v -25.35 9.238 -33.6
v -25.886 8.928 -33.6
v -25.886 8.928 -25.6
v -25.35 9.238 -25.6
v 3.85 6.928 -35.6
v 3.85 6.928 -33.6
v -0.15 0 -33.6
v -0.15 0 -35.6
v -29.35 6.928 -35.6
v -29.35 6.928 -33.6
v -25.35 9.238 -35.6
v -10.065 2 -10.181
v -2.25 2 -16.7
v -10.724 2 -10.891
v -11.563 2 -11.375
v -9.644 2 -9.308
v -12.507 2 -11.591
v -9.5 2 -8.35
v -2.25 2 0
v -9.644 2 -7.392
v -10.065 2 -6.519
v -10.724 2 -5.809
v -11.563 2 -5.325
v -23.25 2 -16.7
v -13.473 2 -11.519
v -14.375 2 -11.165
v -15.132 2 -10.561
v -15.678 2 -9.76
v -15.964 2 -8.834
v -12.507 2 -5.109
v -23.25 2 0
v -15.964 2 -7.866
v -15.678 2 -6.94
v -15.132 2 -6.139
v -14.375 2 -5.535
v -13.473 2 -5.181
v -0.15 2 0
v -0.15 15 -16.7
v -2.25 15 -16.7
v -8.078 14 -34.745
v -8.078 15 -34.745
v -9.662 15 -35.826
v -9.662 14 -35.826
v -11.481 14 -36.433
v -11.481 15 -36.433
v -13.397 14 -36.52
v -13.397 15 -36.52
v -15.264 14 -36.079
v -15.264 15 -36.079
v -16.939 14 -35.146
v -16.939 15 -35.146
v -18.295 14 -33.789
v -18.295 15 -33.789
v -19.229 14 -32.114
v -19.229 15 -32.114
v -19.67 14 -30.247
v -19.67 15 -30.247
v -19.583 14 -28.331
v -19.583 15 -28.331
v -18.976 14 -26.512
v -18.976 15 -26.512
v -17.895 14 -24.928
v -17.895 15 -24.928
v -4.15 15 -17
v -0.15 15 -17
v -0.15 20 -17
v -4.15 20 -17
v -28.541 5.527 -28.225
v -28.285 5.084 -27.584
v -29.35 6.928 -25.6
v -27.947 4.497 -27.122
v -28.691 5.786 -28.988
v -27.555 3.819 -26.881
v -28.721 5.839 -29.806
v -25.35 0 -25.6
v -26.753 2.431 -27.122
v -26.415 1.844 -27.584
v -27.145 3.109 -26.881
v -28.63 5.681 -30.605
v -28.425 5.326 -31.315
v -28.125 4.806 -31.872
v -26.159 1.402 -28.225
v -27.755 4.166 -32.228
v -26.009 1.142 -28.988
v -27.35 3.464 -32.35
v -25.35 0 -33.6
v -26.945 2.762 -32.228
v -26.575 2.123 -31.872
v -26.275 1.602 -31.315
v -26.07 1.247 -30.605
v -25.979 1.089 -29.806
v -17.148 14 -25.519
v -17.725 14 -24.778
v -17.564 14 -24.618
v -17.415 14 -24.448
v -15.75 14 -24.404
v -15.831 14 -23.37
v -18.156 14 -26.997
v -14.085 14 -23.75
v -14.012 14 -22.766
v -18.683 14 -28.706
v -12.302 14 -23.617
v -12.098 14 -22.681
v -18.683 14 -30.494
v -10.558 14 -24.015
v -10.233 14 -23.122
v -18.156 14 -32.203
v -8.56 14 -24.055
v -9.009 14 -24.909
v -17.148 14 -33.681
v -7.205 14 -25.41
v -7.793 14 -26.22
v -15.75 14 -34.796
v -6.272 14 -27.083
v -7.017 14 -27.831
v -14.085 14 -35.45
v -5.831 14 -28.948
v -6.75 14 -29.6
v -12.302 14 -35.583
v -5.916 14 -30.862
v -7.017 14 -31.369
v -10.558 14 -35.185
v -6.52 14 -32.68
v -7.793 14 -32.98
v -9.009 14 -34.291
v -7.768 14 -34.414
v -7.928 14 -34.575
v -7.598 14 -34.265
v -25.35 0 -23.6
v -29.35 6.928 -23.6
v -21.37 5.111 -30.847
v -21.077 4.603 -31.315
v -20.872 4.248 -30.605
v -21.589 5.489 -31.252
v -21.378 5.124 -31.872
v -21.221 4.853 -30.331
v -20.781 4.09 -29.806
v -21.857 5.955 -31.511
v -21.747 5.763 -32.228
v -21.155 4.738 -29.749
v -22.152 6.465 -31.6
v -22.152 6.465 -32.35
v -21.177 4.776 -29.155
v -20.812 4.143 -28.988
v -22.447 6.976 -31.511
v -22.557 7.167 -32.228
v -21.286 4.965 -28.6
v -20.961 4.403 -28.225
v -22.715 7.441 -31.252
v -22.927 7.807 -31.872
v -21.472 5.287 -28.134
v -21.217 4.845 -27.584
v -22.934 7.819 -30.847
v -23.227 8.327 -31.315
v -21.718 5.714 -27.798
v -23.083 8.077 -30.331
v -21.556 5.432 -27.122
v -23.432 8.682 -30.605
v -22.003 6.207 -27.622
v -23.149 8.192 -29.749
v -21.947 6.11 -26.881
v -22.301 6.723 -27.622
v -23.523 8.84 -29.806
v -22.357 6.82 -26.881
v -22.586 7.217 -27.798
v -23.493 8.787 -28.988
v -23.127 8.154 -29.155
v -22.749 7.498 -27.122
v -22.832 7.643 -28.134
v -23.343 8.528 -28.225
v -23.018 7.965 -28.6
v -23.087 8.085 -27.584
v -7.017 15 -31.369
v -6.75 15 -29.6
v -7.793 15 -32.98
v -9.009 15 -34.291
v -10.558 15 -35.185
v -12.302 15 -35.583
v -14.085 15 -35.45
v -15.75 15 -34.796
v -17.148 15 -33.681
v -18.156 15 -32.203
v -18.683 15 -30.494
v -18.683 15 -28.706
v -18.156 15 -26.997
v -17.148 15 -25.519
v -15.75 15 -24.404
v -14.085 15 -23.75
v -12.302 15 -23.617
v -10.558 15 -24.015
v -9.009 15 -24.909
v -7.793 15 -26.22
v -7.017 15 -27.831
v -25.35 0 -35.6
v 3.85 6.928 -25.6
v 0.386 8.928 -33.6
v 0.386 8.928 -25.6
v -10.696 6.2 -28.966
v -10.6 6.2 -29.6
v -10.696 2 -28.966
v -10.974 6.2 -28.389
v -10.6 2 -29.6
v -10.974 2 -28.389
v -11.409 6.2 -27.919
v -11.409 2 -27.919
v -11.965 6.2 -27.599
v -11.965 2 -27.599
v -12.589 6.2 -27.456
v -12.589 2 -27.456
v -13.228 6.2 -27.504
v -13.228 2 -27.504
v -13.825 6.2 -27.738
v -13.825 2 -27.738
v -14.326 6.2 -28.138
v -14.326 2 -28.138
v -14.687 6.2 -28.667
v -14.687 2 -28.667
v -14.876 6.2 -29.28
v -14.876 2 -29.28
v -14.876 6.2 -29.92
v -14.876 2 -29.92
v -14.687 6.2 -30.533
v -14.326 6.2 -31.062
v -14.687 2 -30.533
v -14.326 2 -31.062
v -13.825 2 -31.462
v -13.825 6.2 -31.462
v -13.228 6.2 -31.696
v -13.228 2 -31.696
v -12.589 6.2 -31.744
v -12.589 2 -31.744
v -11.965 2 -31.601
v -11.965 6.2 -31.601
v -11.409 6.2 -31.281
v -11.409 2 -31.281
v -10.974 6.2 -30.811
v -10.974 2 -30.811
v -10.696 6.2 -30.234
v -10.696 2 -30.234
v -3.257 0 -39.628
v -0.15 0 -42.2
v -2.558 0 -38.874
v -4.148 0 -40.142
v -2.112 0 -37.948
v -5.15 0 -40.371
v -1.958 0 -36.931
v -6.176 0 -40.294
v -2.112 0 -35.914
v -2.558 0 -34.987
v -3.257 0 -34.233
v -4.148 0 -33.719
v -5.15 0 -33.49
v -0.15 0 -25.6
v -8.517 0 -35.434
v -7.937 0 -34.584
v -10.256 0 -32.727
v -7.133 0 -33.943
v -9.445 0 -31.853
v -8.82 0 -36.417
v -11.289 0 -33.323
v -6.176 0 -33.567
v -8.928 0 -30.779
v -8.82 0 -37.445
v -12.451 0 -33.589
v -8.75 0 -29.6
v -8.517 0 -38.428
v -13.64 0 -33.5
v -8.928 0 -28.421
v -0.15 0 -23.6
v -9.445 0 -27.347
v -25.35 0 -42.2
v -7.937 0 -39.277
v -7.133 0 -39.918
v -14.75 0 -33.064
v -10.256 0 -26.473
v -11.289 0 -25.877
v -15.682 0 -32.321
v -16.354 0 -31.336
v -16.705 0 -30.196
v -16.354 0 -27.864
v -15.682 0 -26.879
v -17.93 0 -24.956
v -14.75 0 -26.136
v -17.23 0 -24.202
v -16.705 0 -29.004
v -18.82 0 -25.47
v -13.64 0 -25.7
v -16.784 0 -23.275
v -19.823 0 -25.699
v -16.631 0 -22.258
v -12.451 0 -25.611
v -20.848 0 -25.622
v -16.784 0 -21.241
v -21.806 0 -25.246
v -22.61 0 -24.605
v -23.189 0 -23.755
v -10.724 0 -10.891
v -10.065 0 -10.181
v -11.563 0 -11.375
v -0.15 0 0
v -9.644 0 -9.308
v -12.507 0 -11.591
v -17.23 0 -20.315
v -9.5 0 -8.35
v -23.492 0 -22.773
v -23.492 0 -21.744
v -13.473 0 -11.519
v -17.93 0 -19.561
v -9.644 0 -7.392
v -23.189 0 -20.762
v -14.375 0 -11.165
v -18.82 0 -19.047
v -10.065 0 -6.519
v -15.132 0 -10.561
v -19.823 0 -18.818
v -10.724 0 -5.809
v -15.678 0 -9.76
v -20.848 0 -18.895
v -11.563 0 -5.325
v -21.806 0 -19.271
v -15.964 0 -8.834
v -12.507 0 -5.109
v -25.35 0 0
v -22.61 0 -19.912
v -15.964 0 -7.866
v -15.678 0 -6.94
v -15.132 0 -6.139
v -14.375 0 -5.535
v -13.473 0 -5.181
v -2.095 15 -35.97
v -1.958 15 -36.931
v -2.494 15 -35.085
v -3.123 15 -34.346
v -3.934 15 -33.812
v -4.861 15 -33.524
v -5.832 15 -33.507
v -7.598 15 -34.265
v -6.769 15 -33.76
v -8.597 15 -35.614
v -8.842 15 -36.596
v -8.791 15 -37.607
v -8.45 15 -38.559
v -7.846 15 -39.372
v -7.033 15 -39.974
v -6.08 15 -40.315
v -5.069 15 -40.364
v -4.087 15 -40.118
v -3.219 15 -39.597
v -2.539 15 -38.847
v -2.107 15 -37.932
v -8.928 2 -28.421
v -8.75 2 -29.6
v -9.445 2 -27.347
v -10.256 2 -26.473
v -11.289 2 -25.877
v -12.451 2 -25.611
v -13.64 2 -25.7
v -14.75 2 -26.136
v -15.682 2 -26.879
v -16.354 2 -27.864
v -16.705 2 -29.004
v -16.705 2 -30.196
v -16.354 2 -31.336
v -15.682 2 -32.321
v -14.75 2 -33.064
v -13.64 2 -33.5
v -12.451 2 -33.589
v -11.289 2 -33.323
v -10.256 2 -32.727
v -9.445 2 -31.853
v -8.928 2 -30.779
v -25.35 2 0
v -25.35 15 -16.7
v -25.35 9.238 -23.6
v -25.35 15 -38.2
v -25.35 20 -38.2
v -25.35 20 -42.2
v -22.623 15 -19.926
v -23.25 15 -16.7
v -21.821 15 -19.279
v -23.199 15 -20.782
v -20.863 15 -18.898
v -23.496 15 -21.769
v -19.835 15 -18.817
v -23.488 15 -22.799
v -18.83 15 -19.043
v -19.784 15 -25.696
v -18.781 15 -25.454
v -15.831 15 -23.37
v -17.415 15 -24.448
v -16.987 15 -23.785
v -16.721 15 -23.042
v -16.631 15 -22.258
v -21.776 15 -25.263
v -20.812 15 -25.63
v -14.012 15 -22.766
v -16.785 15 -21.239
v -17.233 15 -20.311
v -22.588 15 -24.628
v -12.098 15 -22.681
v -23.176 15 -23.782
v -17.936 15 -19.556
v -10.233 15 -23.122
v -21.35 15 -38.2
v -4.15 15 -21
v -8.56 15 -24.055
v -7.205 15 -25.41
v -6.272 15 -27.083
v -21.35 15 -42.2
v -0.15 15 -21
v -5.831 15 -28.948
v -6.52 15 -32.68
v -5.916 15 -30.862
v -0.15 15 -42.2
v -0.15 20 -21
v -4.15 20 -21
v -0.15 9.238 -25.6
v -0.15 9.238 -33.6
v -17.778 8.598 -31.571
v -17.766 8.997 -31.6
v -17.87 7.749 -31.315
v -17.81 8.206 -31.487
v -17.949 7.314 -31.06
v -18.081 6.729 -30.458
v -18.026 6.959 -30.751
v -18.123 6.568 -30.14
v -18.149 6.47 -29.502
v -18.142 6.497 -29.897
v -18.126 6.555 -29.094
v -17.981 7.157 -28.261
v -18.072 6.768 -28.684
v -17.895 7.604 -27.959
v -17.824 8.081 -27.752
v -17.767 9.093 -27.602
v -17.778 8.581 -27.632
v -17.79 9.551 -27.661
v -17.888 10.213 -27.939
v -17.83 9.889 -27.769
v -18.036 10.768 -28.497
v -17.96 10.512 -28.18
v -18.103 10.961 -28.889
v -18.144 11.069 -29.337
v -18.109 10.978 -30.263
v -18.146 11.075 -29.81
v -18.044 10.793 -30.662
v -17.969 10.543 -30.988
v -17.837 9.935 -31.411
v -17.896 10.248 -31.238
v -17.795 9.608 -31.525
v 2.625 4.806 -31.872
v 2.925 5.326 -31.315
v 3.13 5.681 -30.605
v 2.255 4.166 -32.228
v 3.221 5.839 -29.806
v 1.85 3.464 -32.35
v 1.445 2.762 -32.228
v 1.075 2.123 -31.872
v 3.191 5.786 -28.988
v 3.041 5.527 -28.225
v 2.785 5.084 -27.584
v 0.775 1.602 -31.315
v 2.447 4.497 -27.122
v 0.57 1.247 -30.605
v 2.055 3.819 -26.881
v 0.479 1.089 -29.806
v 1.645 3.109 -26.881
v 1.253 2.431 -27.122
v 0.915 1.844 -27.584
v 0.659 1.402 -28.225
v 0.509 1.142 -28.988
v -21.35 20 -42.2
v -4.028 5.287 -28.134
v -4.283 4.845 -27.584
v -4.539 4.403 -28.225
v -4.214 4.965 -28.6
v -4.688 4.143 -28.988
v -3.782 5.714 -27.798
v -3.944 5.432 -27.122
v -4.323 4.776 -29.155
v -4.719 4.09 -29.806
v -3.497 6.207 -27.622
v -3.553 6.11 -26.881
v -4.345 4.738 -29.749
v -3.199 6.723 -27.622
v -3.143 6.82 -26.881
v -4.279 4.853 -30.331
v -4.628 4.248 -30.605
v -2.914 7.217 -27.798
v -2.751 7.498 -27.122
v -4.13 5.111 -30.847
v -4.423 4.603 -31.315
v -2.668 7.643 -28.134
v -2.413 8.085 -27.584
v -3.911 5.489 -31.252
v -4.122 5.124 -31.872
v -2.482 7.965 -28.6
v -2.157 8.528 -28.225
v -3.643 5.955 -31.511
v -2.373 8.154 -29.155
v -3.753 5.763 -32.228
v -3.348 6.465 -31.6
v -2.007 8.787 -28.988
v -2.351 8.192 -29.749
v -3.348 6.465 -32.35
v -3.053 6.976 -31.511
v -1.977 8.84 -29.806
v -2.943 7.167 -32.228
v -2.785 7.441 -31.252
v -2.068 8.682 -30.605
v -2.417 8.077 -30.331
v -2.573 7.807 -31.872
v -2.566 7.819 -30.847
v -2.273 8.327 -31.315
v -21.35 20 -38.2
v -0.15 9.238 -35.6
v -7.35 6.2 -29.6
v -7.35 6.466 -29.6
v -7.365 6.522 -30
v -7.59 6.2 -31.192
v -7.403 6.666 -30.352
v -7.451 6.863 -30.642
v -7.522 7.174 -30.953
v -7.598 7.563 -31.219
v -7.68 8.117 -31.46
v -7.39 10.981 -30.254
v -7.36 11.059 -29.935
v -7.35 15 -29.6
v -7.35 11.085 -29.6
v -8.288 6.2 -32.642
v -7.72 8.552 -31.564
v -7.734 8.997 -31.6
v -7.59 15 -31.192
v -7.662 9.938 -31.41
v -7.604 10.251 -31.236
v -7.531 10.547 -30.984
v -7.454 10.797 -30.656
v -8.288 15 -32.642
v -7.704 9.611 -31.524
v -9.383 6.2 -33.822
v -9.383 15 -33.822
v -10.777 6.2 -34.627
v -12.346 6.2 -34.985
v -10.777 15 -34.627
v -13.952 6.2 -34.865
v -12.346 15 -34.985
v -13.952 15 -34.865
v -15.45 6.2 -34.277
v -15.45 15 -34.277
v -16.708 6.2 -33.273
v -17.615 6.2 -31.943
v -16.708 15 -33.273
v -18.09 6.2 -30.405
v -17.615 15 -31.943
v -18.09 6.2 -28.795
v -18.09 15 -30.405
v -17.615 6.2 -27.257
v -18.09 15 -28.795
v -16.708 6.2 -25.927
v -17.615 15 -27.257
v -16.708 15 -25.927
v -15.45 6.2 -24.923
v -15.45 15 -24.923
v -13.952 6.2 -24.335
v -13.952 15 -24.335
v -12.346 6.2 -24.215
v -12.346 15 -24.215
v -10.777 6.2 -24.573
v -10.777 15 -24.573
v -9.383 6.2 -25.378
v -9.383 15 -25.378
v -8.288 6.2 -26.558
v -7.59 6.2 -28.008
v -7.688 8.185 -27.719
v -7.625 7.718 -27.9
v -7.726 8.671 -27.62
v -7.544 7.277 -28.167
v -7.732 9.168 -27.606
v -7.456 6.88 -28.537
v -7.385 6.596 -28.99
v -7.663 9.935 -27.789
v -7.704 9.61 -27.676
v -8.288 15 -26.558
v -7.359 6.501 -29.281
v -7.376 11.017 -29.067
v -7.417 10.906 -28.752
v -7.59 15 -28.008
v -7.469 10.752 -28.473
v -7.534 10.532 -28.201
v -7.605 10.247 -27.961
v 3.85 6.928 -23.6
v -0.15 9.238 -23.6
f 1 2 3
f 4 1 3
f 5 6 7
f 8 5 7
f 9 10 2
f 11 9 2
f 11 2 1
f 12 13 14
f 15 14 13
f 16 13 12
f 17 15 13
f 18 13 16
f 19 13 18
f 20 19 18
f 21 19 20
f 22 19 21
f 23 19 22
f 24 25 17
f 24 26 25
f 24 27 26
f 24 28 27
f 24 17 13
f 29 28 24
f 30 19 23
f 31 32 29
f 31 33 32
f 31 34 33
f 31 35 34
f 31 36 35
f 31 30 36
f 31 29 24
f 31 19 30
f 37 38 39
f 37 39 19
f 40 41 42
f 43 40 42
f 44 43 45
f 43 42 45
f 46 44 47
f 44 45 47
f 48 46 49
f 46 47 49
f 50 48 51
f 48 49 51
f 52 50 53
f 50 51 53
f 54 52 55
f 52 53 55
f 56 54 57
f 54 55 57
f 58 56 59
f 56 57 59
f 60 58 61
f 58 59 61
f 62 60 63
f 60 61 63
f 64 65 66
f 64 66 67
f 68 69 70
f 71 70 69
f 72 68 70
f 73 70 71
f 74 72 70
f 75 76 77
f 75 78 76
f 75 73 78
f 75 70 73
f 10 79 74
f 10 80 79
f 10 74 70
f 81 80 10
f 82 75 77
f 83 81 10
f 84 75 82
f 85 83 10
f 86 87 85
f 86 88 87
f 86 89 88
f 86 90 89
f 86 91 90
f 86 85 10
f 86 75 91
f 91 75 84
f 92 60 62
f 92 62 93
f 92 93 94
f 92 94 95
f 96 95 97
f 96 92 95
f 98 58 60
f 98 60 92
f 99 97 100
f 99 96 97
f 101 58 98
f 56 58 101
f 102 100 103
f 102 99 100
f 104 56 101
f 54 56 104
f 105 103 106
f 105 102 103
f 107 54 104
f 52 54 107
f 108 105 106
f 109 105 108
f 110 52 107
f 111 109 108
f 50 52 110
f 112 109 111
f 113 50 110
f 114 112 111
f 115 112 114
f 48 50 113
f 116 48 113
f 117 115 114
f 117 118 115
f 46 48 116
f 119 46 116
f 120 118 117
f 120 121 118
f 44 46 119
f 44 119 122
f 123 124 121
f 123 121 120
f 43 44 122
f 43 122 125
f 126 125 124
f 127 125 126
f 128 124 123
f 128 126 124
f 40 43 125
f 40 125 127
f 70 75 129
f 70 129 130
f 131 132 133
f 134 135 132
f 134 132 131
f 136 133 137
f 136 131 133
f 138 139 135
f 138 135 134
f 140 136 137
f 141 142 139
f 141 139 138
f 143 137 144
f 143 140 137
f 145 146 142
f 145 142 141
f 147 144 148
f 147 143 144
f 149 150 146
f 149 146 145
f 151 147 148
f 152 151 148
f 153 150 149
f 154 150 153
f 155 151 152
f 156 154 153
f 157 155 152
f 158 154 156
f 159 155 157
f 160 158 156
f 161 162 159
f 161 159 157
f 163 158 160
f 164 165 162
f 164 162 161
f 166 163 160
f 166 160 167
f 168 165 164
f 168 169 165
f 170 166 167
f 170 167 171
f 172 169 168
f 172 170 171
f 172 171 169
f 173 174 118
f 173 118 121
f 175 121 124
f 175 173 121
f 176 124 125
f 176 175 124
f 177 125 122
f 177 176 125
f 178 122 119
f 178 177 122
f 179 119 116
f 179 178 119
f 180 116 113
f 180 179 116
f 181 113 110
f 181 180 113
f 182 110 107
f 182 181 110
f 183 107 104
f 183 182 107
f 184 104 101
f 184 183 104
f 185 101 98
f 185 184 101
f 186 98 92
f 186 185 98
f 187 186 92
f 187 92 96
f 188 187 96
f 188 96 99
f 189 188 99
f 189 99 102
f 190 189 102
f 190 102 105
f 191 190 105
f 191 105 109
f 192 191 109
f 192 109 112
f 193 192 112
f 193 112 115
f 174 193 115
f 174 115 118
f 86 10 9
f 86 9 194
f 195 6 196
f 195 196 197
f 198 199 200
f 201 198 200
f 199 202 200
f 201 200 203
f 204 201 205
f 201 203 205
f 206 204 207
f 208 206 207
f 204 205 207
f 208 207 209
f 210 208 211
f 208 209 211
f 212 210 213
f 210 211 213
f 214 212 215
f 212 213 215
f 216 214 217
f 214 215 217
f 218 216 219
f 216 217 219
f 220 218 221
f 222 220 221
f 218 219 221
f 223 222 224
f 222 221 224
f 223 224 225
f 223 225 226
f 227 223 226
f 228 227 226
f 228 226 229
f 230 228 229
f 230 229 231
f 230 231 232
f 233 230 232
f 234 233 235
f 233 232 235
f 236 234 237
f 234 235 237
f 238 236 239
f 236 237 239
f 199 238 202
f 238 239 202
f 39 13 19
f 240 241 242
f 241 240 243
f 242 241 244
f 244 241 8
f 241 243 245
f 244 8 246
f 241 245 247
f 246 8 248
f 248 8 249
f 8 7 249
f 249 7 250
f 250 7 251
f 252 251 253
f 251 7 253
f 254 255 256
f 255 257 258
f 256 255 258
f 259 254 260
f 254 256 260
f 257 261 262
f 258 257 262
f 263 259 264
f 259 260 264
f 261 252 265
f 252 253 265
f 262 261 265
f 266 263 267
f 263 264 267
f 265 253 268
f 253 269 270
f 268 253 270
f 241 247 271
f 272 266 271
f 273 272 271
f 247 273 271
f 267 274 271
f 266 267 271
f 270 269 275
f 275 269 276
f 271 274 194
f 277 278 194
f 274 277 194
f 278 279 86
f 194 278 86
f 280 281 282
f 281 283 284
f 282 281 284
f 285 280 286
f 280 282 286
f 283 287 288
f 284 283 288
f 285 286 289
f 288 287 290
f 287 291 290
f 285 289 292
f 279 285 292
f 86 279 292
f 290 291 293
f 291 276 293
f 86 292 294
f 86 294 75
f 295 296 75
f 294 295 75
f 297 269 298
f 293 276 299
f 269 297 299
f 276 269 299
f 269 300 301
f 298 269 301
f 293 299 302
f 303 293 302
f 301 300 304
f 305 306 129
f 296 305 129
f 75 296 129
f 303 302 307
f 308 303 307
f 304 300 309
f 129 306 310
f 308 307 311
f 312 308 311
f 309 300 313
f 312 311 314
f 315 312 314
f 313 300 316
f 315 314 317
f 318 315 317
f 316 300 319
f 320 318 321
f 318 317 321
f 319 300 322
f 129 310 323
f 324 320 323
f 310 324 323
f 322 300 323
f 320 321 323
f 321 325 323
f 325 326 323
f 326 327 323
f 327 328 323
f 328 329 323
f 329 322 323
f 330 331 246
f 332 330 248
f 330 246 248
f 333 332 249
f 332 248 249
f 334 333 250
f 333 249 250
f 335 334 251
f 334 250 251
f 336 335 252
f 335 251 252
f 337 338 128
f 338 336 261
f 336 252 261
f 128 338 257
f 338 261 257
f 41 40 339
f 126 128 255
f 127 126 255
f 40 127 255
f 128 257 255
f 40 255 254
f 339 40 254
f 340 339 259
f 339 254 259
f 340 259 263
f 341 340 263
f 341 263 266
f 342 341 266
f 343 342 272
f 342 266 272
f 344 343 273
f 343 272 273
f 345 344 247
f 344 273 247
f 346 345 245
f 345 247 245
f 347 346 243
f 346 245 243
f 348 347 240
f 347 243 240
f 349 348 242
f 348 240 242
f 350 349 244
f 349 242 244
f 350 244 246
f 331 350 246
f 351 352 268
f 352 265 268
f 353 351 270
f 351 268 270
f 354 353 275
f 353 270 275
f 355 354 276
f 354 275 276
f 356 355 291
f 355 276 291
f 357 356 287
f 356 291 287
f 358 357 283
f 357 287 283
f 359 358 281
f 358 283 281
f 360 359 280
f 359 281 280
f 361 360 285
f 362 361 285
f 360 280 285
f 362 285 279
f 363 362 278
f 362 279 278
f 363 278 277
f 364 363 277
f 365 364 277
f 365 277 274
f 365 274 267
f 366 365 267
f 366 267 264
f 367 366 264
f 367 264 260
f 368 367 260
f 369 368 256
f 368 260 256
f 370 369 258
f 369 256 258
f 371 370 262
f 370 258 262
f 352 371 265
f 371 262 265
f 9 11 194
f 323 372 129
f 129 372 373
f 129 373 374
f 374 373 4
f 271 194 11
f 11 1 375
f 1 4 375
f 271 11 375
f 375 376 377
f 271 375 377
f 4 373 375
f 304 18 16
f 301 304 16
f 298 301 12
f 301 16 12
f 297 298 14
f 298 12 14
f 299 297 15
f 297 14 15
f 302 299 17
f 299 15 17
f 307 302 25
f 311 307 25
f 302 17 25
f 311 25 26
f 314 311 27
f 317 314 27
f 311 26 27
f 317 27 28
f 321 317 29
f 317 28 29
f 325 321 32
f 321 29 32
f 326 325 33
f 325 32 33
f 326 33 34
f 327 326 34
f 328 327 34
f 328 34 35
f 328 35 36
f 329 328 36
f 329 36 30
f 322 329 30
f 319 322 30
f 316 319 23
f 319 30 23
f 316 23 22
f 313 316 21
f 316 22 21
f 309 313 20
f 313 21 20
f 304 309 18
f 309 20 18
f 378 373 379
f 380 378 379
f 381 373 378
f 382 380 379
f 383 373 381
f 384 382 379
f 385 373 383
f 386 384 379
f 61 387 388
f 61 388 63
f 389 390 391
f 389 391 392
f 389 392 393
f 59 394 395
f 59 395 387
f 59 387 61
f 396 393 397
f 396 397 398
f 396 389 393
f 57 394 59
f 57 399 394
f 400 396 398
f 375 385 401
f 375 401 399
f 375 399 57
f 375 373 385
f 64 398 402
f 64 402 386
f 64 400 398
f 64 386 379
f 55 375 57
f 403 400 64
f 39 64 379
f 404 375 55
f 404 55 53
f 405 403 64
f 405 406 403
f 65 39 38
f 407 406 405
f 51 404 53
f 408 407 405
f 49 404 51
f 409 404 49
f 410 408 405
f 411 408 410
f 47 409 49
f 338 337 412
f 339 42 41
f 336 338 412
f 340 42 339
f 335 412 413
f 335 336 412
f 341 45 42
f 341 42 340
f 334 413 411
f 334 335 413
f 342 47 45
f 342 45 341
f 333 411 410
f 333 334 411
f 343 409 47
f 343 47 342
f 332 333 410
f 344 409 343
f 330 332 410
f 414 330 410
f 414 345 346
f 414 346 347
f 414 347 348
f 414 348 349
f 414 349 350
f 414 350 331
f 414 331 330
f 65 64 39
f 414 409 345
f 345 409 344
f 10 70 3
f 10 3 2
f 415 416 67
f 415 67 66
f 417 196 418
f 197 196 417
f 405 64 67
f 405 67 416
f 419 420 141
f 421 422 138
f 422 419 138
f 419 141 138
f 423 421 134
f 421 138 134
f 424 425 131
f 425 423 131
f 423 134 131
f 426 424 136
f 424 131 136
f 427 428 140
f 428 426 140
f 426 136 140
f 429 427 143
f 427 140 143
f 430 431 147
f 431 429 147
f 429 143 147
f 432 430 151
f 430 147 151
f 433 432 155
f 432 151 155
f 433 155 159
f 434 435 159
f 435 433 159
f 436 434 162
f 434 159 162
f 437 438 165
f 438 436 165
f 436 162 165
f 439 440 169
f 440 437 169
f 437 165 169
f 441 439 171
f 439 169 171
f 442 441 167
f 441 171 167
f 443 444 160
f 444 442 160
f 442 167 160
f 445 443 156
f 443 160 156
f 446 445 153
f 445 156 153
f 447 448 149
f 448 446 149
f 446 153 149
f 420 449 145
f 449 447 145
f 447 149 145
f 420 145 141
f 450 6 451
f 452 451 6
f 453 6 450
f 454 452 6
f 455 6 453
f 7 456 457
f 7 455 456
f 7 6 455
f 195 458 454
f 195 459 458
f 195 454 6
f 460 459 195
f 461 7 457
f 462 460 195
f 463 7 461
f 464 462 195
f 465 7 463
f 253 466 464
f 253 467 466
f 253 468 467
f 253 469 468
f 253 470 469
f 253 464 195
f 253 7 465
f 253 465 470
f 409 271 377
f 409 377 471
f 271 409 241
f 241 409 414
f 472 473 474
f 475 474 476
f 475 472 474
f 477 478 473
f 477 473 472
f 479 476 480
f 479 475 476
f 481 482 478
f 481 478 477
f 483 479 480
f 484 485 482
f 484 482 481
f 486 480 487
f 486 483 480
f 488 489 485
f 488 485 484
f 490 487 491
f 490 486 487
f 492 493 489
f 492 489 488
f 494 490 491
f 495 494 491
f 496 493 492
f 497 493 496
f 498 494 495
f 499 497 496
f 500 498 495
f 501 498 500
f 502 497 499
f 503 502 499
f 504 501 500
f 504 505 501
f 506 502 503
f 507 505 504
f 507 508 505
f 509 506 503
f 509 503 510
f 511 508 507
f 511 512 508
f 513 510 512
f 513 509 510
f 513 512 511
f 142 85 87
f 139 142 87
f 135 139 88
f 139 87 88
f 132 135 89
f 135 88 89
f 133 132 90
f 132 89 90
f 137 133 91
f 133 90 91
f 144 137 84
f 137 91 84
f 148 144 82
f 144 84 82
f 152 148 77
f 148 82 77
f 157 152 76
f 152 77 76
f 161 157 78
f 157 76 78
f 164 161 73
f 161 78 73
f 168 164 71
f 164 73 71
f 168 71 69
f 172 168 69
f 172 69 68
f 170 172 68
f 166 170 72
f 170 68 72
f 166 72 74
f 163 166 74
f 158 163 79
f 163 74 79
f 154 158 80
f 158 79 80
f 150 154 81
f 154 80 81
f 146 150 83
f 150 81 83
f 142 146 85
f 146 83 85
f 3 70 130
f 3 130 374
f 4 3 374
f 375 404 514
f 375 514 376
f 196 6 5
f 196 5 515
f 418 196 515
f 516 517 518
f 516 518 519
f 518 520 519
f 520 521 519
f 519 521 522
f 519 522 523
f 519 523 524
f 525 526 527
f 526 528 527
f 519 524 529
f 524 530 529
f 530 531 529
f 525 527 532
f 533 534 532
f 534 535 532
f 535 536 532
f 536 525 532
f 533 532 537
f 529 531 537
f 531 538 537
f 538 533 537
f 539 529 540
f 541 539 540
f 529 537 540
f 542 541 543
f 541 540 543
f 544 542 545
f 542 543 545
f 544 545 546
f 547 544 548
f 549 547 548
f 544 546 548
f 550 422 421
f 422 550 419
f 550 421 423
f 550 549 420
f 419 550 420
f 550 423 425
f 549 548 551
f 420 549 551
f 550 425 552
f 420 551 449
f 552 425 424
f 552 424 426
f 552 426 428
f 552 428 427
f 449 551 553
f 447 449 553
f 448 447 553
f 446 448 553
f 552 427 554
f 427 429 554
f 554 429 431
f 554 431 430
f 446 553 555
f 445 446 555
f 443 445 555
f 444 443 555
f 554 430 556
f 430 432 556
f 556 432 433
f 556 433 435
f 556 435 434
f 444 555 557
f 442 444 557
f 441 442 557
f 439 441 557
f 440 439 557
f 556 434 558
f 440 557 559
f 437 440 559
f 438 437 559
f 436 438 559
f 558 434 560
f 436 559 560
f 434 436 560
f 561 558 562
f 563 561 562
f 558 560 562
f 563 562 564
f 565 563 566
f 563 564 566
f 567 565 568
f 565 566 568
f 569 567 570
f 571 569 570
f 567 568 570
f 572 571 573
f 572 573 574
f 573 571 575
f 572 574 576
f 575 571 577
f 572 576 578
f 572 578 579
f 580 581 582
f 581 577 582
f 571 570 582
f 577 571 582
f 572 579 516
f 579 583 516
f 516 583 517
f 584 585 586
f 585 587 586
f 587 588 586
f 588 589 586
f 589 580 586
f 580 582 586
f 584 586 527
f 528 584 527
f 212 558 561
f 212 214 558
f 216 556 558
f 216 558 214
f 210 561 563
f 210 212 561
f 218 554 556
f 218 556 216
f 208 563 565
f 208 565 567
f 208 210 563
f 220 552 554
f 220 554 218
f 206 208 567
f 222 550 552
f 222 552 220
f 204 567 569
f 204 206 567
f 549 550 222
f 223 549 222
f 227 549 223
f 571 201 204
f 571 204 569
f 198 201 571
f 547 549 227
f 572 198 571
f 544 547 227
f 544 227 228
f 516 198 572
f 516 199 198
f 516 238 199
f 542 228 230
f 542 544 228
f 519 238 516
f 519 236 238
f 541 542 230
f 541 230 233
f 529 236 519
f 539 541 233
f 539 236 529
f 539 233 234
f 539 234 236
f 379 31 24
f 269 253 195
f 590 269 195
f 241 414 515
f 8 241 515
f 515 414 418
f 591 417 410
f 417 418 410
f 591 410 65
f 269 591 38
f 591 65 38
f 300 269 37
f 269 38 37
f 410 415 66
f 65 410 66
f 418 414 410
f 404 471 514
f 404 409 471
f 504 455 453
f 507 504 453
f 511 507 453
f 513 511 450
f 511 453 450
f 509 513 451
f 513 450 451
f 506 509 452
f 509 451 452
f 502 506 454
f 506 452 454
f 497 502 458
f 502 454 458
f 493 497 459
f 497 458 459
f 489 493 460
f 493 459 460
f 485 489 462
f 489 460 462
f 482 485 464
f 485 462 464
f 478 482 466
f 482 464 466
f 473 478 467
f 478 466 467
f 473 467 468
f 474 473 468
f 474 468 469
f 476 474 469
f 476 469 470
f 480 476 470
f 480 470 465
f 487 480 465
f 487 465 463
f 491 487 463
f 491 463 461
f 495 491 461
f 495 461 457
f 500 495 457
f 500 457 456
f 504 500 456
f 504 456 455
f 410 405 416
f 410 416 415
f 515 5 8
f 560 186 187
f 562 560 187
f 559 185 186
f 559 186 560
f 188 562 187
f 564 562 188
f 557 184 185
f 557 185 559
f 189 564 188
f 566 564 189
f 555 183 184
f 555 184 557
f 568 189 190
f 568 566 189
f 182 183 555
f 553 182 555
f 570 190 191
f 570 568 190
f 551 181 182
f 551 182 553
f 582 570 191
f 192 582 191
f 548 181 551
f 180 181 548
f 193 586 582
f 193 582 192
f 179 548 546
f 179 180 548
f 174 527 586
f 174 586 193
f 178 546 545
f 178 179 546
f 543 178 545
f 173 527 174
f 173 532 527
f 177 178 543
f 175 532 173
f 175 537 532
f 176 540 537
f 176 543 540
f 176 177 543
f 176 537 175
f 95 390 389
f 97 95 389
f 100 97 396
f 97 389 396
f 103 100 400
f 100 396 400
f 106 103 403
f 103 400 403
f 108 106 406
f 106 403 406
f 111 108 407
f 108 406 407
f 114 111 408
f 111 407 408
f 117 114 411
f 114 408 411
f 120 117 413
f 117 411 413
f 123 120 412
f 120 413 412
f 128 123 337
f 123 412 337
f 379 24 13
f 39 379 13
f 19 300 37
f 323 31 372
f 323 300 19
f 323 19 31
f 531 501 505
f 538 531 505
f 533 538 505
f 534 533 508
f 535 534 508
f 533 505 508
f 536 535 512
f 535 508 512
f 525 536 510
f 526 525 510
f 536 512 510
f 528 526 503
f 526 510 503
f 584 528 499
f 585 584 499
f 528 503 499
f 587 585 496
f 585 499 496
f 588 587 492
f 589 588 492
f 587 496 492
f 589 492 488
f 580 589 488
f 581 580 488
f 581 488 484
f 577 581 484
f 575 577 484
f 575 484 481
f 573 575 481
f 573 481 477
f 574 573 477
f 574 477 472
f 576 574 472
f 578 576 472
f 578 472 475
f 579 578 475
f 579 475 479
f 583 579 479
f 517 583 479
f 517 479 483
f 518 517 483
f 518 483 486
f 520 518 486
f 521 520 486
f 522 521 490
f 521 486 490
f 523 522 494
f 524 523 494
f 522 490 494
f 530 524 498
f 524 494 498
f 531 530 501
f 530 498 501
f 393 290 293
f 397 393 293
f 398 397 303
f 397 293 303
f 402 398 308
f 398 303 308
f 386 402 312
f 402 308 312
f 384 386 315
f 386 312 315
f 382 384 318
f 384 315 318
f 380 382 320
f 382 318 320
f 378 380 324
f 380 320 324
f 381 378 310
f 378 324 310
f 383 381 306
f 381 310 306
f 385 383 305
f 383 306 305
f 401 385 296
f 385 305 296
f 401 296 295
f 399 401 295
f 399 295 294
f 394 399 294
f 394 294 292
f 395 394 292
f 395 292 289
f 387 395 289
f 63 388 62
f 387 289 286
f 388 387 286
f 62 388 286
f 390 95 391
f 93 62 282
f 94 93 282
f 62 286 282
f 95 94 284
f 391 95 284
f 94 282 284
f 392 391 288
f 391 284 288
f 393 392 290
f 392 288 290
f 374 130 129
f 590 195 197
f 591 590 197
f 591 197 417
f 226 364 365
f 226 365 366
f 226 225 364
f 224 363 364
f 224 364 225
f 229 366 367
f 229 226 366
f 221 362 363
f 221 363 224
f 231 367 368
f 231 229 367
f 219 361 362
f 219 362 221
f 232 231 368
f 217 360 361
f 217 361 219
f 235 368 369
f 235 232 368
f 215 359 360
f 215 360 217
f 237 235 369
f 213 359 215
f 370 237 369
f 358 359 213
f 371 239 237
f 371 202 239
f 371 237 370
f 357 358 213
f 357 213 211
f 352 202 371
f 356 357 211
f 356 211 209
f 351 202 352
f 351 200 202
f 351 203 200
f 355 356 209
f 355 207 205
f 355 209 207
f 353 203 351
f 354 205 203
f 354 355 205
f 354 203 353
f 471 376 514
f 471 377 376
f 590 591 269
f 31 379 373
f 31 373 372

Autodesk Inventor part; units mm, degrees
ref_plane "YZ Plane" through (0, 0, 0) normal (1, 0, 0) x (0, 1, 0)
sketch "Sketch1" plane through (0, 0, 0) normal (0, 1, 0) x (-1, 0, 0)
  line L0 (0, 0) -> (25.5, 0)
  line L1 (25.5, 0) -> (25.5, -42.5)
  line L2 (25.5, -42.5) -> (0, -42.5)
  line L3 (0, -42.5) -> (0, 0)
  dimension "d0" = 25.5
  dimension "d1" = 42.5
extrude "Extrusion1" add sketch "Sketch1" along normal blind 2
sketch "Sketch2" plane through (0, 2, 0) normal (0, 1, 0) x (1, 0, 0)
  line L0 (-25.5, 0) -> (0, 0) projected
  line L1 (-12.75, 0) -> (-2.25, 0)
  line L2 (-2.25, 0) -> (-23.25, 0)
  line L3 (-23.25, 0) -> (-23.25, 16.7)
  line L4 (-23.25, 16.7) -> (-2.25, 16.7)
  line L5 (-2.25, 16.7) -> (-2.25, 0)
  line L6 (-2.25, 0) -> (0, 0)
  line L7 (0, 0) -> (0, 19.3638)
  line L8 (0, 0) -> (0, 42.5) projected
  line L9 (0, 19.3638) -> (-25.5, 19.3638)
  line L10 (-25.5, 19.3638) -> (-25.5, 0)
  line L11 (-25.5, 0) -> (-23.25, 0)
  dimension "d4" = 10.5
  dimension "d5" = 21
  dimension "d6" = 16.7
extrude "Extrusion2" add sketch "Sketch2" along normal blind 13 contours L10 L9 L7 L0 L5 L4 L3
sketch "Sketch3" plane through (0, 0, 0) normal (1, 0, 0) x (0, 0, -1)
  line L0 (0, 2) -> (16.7, 2) projected
  line L1 (42.5, 0) -> (0, 0) projected
  line L2 (42.5, 0) -> (42.5, 2) projected
  line L3 (19.3638, 2) -> (42.5, 2) projected
  line L4 (19.3638, 2) -> (19.3638, 15) projected
  line L5 (0, 15) -> (19.3638, 15) projected
  line L6 (0, 0) -> (0, 15) projected
  line L7 (16.7, 2) -> (16.7, 15)
  line L8 (16.7, 15) -> (0, 2)
  line L9 (0, 0) -> (0, 15) projected
  line L10 (0, 2) -> (0, 15)
  line L11 (0, 15) -> (16.7, 15)
extrude "Extrusion3" cut sketch "Sketch3" against normal blind 130 contours L6 L5 L8
sketch "Sketch4" plane through (0, 2, 0) normal (0, 1, 0) x (1, 0, 0)
  line L0 (-23.25, 16.7) -> (-23.25, 0) projected
  line L1 (-23.25, 0) -> (-2.25, 0) projected
  line L2 (-2.25, 0) -> (-2.25, 16.7) projected
  line L3 (-2.25, 16.7) -> (-23.25, 16.7) projected
  circle A0 centre (-12.75, 8.35) radius 3.25
  point P0 (0, 0)
  dimension "d11" = 6.5
extrude "Extrusion4" cut sketch "Sketch4" against normal blind 130 contours A0
sketch "Sketch5" plane through (0, 2, 0) normal (0, 1, 0) x (1, 0, 0)
  line L0 (-25.5, 19.3638) -> (0, 19.3638) projected
  line L1 (0, 19.3638) -> (0, 42.5) projected
  line L2 (0, 42.5) -> (-25.5, 42.5) projected
  line L3 (-25.5, 42.5) -> (-25.5, 19.3638) projected
  point P0 (0, 0)
extrude "Extrusion5" add sketch "Sketch5" along normal blind 13
sketch "Sketch6" plane through (0, 15, 0) normal (0, 1, 0) x (1, 0, 0)
  point P0 (0, 0)
sketch "Sketch7" plane through (0, 15, 0) normal (0, 1, 0) x (1, 0, 0)
  line L0 (-25.5, 16.7) -> (-23.25, 16.7) projected
  line L1 (-23.25, 16.7) -> (-2.25, 16.7) projected
  line L2 (-2.25, 16.7) -> (0, 16.7) projected
  line L3 (0, 16.7) -> (0, 42.5) projected
  line L4 (0, 42.5) -> (-25.5, 42.5) projected
  line L5 (-25.5, 42.5) -> (-25.5, 16.7) projected
  circle A0 centre (-12.75, 29.6) radius 5.4
  point P0 (0, 0)
  dimension "d16" = 10.8
extrude "Extrusion6" cut sketch "Sketch7" against normal blind 8.8 contours A0
sketch "Sketch8" plane through (-12.75, 6.2, -29.6) normal (0, 1, 0) x (1, 0, 0)
  circle A0 centre (0, 0) radius 5.4 projected
  circle A1 centre (0, 0) radius 2.075
  point P0 (12.75, -29.6)
  dimension "d19" = 4.15
extrude "Extrusion7" cut sketch "Sketch8" against normal blind 8.8 contours A1
sketch "Sketch9" plane through (0, 15, 0) normal (0, 1, 0) x (1, 0, 0)
  line L0 (-25.35, 42.2) -> (-0.15, 42.2)
  line L1 (-0.15, 42.2) -> (-0.15, 17)
  line L2 (-0.15, 17) -> (-25.35, 17)
  line L3 (-25.35, 17) -> (-25.35, 42.2)
  line L4 (-0.15, 17) -> (-4.15, 17)
  line L5 (-4.15, 17) -> (-4.15, 21)
  line L6 (-4.15, 21) -> (-0.15, 21)
  line L7 (-0.15, 21) -> (-0.15, 17)
  line L8 (-25.35, 42.2) -> (-21.35, 42.2)
  line L9 (-21.35, 42.2) -> (-21.35, 38.2)
  line L10 (-21.35, 38.2) -> (-25.35, 38.2)
  line L11 (-25.35, 38.2) -> (-25.35, 42.2)
  circle A0 centre (-12.75, 29.6) radius 5.4 projected
  line L12 (-25.5, 16.7) -> (-23.25, 16.7) projected
  line L13 (-23.25, 16.7) -> (-2.25, 16.7) projected
  line L14 (-2.25, 16.7) -> (0, 16.7) projected
  line L15 (0, 16.7) -> (0, 42.5) projected
  line L16 (0, 42.5) -> (-25.5, 42.5) projected
  line L17 (-25.5, 42.5) -> (-25.5, 16.7) construction
  line L18 (-25.35, 42.2) -> (-27.4299, 42.2)
  line L19 (-27.4299, 42.2) -> (-27.4299, -5.4814)
  line L20 (-27.4299, -5.4814) -> (-25.35, -5.4814)
  line L21 (-25.35, -5.4814) -> (-25.35, 42.2)
  line L22 (-25.35, 42.2) -> (-27.4299, 42.2)
  line L23 (-27.4299, 42.2) -> (-27.4299, 44.6012)
  line L24 (-27.4299, 44.6012) -> (-25.35, 44.6012)
  line L25 (-25.35, 44.6012) -> (-25.35, 42.2)
  line L26 (-27.4299, 44.6012) -> (1.4745, 44.6012)
  line L27 (1.4745, 44.6012) -> (1.4745, 42.2)
  line L28 (1.4745, 42.2) -> (-27.4299, 42.2)
  line L29 (-27.4299, 42.2) -> (-27.4299, 44.6012)
  line L30 (-0.15, 17) -> (3.4405, 17)
  line L31 (3.4405, 17) -> (3.4405, 44.8771)
  line L32 (3.4405, 44.8771) -> (-0.15, 44.8771)
  line L33 (-0.15, 44.8771) -> (-0.15, 17)
  line L34 (-0.15, 17) -> (3.4405, 17)
  line L35 (3.4405, 17) -> (3.4405, -4.7226)
  line L36 (3.4405, -4.7226) -> (-0.15, -4.7226)
  line L37 (-0.15, -4.7226) -> (-0.15, 17)
  point P0 (0, 0)
  dimension "d22" = 25.2
  dimension "d23" = 25.2
  dimension "d24" = 4
  dimension "d25" = 4
  dimension "d26" = 4
  dimension "d27" = 4
extrude "Extrusion8" add sketch "Sketch9" along normal blind 5 contours L25 L16 L33 L0 | L0 L9 L10 L3 | L3 L21 L20 L19 L18 | L25 L26 L33 L16 | L28 L15 L30 L1 | L33 L16 L15 L28 | L33 L26 L27 L28 L15 L16 | L1 L2 L5 L6 | L28 L27 L26 L33 L32 L31 L30 L15 | L30 L15 L14 L37 | L30 L35 L36 L37 L14 L15
sketch "Sketch10" plane through (0, 20, 0) normal (0, 1, 0) x (1, 0, 0)
  line L0 (-0.15, 42.2) -> (-0.15, 21) projected
  line L1 (-0.15, 21) -> (-4.15, 21) projected
  line L2 (-4.15, 21) -> (-4.15, 17) projected
  line L3 (-4.15, 17) -> (-0.15, 17) projected
  line L4 (-0.15, 17) -> (-0.15, -4.7226) projected
  line L5 (-0.15, -4.7226) -> (3.4405, -4.7226) projected
  line L6 (3.4405, -4.7226) -> (3.4405, 44.8771) projected
  line L7 (3.4405, 44.8771) -> (-0.15, 44.8771) projected
  line L8 (-0.15, 44.8771) -> (-0.15, 44.6012) projected
  line L9 (-0.15, 44.6012) -> (-25.35, 44.6012) projected
  line L10 (-25.35, 44.6012) -> (-25.35, 42.2) projected
  line L11 (-25.35, 42.2) -> (-27.4299, 42.2) projected
  line L12 (-27.4299, 42.2) -> (-27.4299, -5.4814) projected
  line L13 (-27.4299, -5.4814) -> (-25.35, -5.4814) projected
  line L14 (-25.35, -5.4814) -> (-25.35, 38.2) projected
  line L15 (-25.35, 38.2) -> (-21.35, 38.2) projected
  line L16 (-21.35, 38.2) -> (-21.35, 42.2) projected
  line L17 (-21.35, 42.2) -> (-0.15, 42.2) projected
  line L18 (-21.35, 42.2) -> (-21.35, 38.2) projected
  line L19 (-21.35, 38.2) -> (-25.35, 38.2)
  line L20 (-25.35, 38.2) -> (-25.35, 42.2)
  line L21 (-25.35, 42.2) -> (-21.35, 42.2)
  line L22 (-21.35, 42.2) -> (-21.35, 38.2)
  line L23 (-0.15, 42.2) -> (-0.15, 21) projected
  line L24 (-0.15, 21) -> (-4.15, 21)
  line L25 (-4.15, 21) -> (-4.15, 17)
  line L26 (-4.15, 17) -> (-0.15, 17)
  line L27 (-0.15, 17) -> (-0.15, 21)
  line L28 (-25.5, 42.2) -> (-25.35, 42.2) projected
  line L29 (-25.35, 42.2) -> (-25.35, 42.5) projected
  line L30 (-25.35, 42.5) -> (-25.5, 42.5) projected
  line L31 (-25.5, 42.5) -> (-25.5, 42.2) projected
  point P0 (0, 0)
extrude "Extrusion9" cut sketch "Sketch10" against normal blind 1000 contours L17 L21 L10 L9 L8 L7 L6 L5 L4 L27 L0 | L20 L14 L13 L12 L11
sketch "Sketch11" plane through (0, 15, 0) normal (0, 1, 0) x (1, 0, 0)
  line L0 (-25.5, 42.2) -> (-25.35, 42.2) projected
  line L1 (-25.35, 42.2) -> (-25.35, 42.5) projected
  line L2 (-25.35, 42.5) -> (-25.5, 42.5) projected
  line L3 (-25.5, 42.5) -> (-25.5, 42.2) projected
  point P0 (0, 0)
extrude "Extrusion10" cut sketch "Sketch11" against normal blind 1000
sketch "Sketch12" plane through (0, 15, 0) normal (0, 1, 0) x (1, 0, 0)
  circle A0 centre (-20.0808, 22.2584) radius 2.625
  circle A1 centre (-20.0808, 22.2584) radius 2.625
  circle A2 centre (-5.4083, 36.9307) radius 2.625
  circle A3 centre (-12.75, 29.6) radius 5.5
  arc A4 (-25.35, 19) -> (-23.35, 17) centre (-23.35, 19) ccw
  line L0 (-4.15, 17) -> (-23.35, 17)
  line L1 (-4.15, 17) -> (-4.15, 21)
  line L2 (-4.15, 21) -> (-0.15, 21)
  line L3 (-0.15, 40.2) -> (-0.15, 21)
  arc A5 (-0.15, 40.2) -> (-2.15, 42.2) centre (-2.15, 40.2) ccw
  line L4 (-21.35, 42.2) -> (-2.15, 42.2)
  line L5 (-21.35, 42.2) -> (-21.35, 38.2)
  line L6 (-21.35, 38.2) -> (-25.35, 38.2)
  line L7 (-25.35, 19) -> (-25.35, 38.2)
  circle A6 centre (-12.75, 29.6) radius 2.075 projected
  circle A7 centre (-12.75, 29.6) radius 5.4 projected
  point P0 (0, 0)
  point P1 (-25.35, 42.2)
extrude "Extrusion11" cut sketch "Sketch12" against normal blind 1000 contours A0 | A2
sketch "Sketch13" plane through (0, 0, 0) normal (0, -1, 0) x (1, 0, 0)
  circle A0 centre (-5.4083, -36.9307) radius 2.625 projected
  circle A1 centre (-20.0808, -22.2584) radius 2.625 projected
  line L0 (-25.35, 0) -> (-25.35, -42.2) projected
  line L1 (-25.35, -42.2) -> (-0.15, -42.2) projected
  line L2 (-0.15, -42.2) -> (-0.15, 0) projected
  line L3 (-0.15, 0) -> (-25.35, 0) projected
  circle A2 centre (-12.75, -8.35) radius 3.25 projected
  circle A3 centre (-12.75, -29.6) radius 2.075 projected
  circle A4 centre (-20.0808, -22.2584) radius 3.45
  circle A5 centre (-5.4083, -36.9307) radius 3.45
  point P0 (0, 0)
  dimension "d36" = 6.9
  dimension "d37" = 6.9
extrude "Extrusion12" cut sketch "Sketch13" against normal blind 1000 contours A4 | A5
sketch "Sketch14" plane through (0, 0, 0) normal (0, -1, 0) x (1, 0, 0)
  circle A0 centre (-20.0808, -22.2584) radius 3.45 projected
  circle A1 centre (-5.4083, -36.9307) radius 3.45 projected
  line L0 (-25.35, 0) -> (-25.35, -42.2) projected
  line L1 (-25.35, -42.2) -> (-0.15, -42.2) projected
  line L2 (-0.15, -42.2) -> (-0.15, 0) projected
  line L3 (-0.15, 0) -> (-25.35, 0) projected
  circle A2 centre (-12.75, -8.35) radius 3.25 projected
  circle A3 centre (-12.75, -29.6) radius 2.075 projected
  circle A4 centre (-12.75, -29.6) radius 4
  point P0 (0, 0)
  dimension "d40" = 8
extrude "Extrusion13" cut sketch "Sketch14" against normal blind 2 contours A4
sketch "Sketch15" plane through (0, 15, 0) normal (0, 1, 0) x (1, 0, 0)
  circle A0 centre (-20.0808, 22.2584) radius 3.45 projected
  circle A1 centre (-5.4083, 36.9307) radius 3.45 projected
  circle A2 centre (-12.75, 29.6) radius 5.4 projected
  line L0 (-0.15, 16.7) -> (-0.15, 17) projected
  line L1 (-0.15, 17) -> (-4.15, 17) projected
  line L2 (-4.15, 17) -> (-4.15, 21) projected
  line L3 (-4.15, 21) -> (-0.15, 21) projected
  line L4 (-0.15, 21) -> (-0.15, 42.2) projected
  line L5 (-0.15, 42.2) -> (-21.35, 42.2) projected
  line L6 (-21.35, 42.2) -> (-21.35, 38.2) projected
  line L7 (-21.35, 38.2) -> (-25.35, 38.2) projected
  line L8 (-25.35, 38.2) -> (-25.35, 16.7) projected
  line L9 (-25.35, 16.7) -> (-23.25, 16.7) projected
  line L10 (-23.25, 16.7) -> (-2.25, 16.7) projected
  line L11 (-2.25, 16.7) -> (-0.15, 16.7) projected
  circle A3 centre (-12.75, 29.6) radius 6.95
  circle A4 centre (-12.75, 29.6) radius 6
  point P0 (0, 0)
  dimension "d43" = 13.9
  dimension "d44" = 12
extrude "Extrusion14" cut sketch "Sketch15" against normal blind 1 contours A3 A0 | A0 A3 A1 | A3 A1 picked at (-17.6229, 24.6665) picked at (-7.8164, 34.4729)
sketch "Sketch16" plane through (-25.35, 20, -42.2) normal (-1, 0, 0) x (0, 0, 1)
  point P0 (42.2, -20)
ref_plane "Work Plane1" through (-25.35, 0, -29.725) normal (-0.866, -0.5, 0) x (0, 0, -1)
sketch "Sketch17" plane through (-25.35, 0, -29.725) normal (-0.866, -0.5, 0) x (0, 0, -1)
  line L0 (-29.725, 0) -> (12.475, 0) projected
  ellipse E0 centre (-0.125, 4.5679) end of major axis (1.95, 4.5679) minor radius 1.0375 projected
  ellipse E1 centre (-0.125, 6.3) end of major axis (-4.125, 6.3) minor radius 2 projected
  ellipse E2 centre (-0.125, -6.6904) end of major axis (5.275, -6.6904) minor radius 2.7 projected
  line L1 (-0.125, -6.6904) -> (-0.125, 6.3)
  line L2 (-0.125, 0) -> (3.875, 0)
  line L3 (3.875, 0) -> (-4.125, 0)
  line L4 (-4.125, 0) -> (-4.125, -8)
  line L5 (-4.125, -8) -> (3.875, -8)
  line L6 (3.875, -8) -> (3.875, 0)
  point P0 (-29.725, 12.675)
  dimension "d48" = 4
  dimension "d49" = 8
  dimension "d50" = 8
extrude "Extrusion15" add sketch "Sketch17" against normal blind 4 contours L0 L1 E2 L4 | L0 L6 E2 L1 | E2 L6 L5 L4 picked at (-0.125, -6.6635)
sketch "Sketch18" plane through (-21.8859, 2, -29.725) normal (0.866, 0.5, 0) x (0, 0, -1)
  line L0 (3.875, 8) -> (-4.125, 8) projected
  line L1 (3.875, 6.9282) -> (-4.125, 6.9282) projected
  line L2 (3.875, 6.9282) -> (3.875, 8) projected
  line L3 (3.875, 8) -> (-4.125, 8) projected
  line L4 (-4.125, 8) -> (-4.125, 6.9282) projected
  point P0 (-29.725, -12.675)
extrude "Extrusion16" add sketch "Sketch18" along normal blind 1
ref_plane "Work Plane2" through (-12.75, 20, -42.2) normal (-1, 0, 0) x (0, 0, 1)
mirror "Mirror1" about plane through (-12.75, 20, -42.2) normal (-1, 0, 0) of "Extrusion15"
sketch "Sketch19" plane through (-0.15, 8, -33.6) normal (-0.866, 0.5, 0) x (0, 0, 1)
  line L0 (8, 0) -> (0, 0) projected
  line L1 (8, 1.0718) -> (8, 0) projected
  line L2 (0, 1.0718) -> (8, 1.0718) projected
  line L3 (0, 0) -> (0, 1.0718) projected
  point P0 (33.6, -6.8532)
extrude "Extrusion17" add sketch "Sketch19" along normal blind 1
sketch "Sketch20" plane through (3.85, 6.9282, -25.6) normal (0.866, -0.5, 0) x (0, 0, -1)
  point P0 (-25.6, -7.925)
sketch "Sketch21" plane through (3.85, 6.9282, -25.6) normal (0.866, -0.5, 0) x (0, 0, -1)
  line L0 (8, -8) -> (0, -8) projected
  line L1 (8, 0) -> (8, -8) projected
  line L2 (0, 0) -> (8, 0) projected
  line L3 (0, -8) -> (0, 0) projected
  line L4 (8, -8) -> (0, -8) projected
  line L5 (0, -8) -> (0, 0) projected
  circle A0 centre (4, -4) radius 2.75
  point P0 (-25.6, -7.925)
  dimension "d58" = 5.5
extrude "Extrusion18" cut sketch "Sketch21" against normal blind 6 contours A0
sketch "Sketch22" plane through (-3.3462, 6.4641, -29.6) normal (0.866, -0.5, 0) x (0, 0, -1)
  circle A0 centre (0, 0) radius 2.75 projected
  circle A1 centre (0, 0) radius 2
  point P0 (-29.6, -3.925)
  dimension "d61" = 4
extrude "Extrusion19" cut sketch "Sketch22" against normal blind 6 contours A1
mirror "Mirror2" about plane through (-12.75, 20, -42.2) normal (-1, 0, 0) of "Extrusion18", "Extrusion19"
sketch "Sketch23" plane through (-25.35, 0, -33.6) normal (0, 0, -1) x (-1, 0, 0)
  line L0 (0, 0) -> (0, 9.2376) projected
  line L1 (4, 6.9282) -> (0, 0) projected
  line L2 (4, 6.9282) -> (0, 9.2376) projected
  point P0 (-25.35, 0)
extrude "Extrusion20" add sketch "Sketch23" along normal blind 2
sketch "Sketch24" plane through (-25.35, 0, -25.6) normal (0, 0, 1) x (1, 0, 0)
  line L0 (1.8212, 8.8457) -> (-3.375, 5.8457) projected
  line L1 (0, 9.2376) -> (0, 0) projected
  line L2 (-4, 6.9282) -> (0, 9.2376) projected
  line L3 (0, 0) -> (-4, 6.9282) projected
  point P0 (25.35, 0)
extrude "Extrusion21" add sketch "Sketch24" along normal blind 2
sketch "Sketch25" plane through (-0.15, 0, -25.6) normal (0, 0, 1) x (1, 0, 0)
  line L0 (0, 0) -> (0, 9.2376) projected
  line L1 (0, 0) -> (4, 6.9282) projected
  line L2 (4, 6.9282) -> (0, 9.2376) projected
  point P0 (0.15, 0)
extrude "Extrusion22" add sketch "Sketch25" along normal blind 2
sketch "Sketch26" plane through (-0.15, 0, -33.6) normal (0, 0, -1) x (-1, 0, 0)
  point P0 (-0.15, 0)
sketch "Sketch27" plane through (-0.15, 0, -33.6) normal (0, 0, -1) x (-1, 0, 0)
  line L0 (0, 9.2376) -> (0, 0) projected
  line L1 (-4, 6.9282) -> (0, 9.2376) projected
  line L2 (-4, 6.9282) -> (0, 0) projected
  point P0 (-0.15, 0)
extrude "Extrusion23" add sketch "Sketch27" along normal blind 2
sketch "Sketch28" plane through (0, 0, 0) normal (0, -1, 0) x (1, 0, 0)
  circle A0 centre (-12.75, -29.6) radius 4 projected
  circle A1 centre (-20.0808, -22.2584) radius 3.45 projected
  circle A2 centre (-5.4083, -36.9307) radius 3.45 projected
  line L0 (-25.35, 0) -> (-25.35, -23.6) projected
  line L1 (-25.35, -23.6) -> (-25.35, -35.6) projected
  line L2 (-25.35, -35.6) -> (-25.35, -42.2) projected
  line L3 (-25.35, -42.2) -> (-0.15, -42.2) projected
  line L4 (-0.15, -42.2) -> (-0.15, -35.6) projected
  line L5 (-0.15, -35.6) -> (-0.15, -23.6) projected
  line L6 (-0.15, -23.6) -> (-0.15, 0) projected
  line L7 (-0.15, 0) -> (-25.35, 0) projected
  circle A3 centre (-12.75, -8.35) radius 3.25 projected
  circle A4 centre (-12.75, -29.6) radius 2.075 projected
  point P0 (0, 0)
sketch "Sketch29" plane through (-12.75, 2, -29.6) normal (0, -1, 0) x (1, 0, 0)
  circle A0 centre (0, 0) radius 2.15
  point P0 (12.75, 29.6)
  dimension "d72" = 4.3
extrude "Extrusion24" cut sketch "Sketch29" against normal blind 10
properties part number "uppernozzle" material "Water"
